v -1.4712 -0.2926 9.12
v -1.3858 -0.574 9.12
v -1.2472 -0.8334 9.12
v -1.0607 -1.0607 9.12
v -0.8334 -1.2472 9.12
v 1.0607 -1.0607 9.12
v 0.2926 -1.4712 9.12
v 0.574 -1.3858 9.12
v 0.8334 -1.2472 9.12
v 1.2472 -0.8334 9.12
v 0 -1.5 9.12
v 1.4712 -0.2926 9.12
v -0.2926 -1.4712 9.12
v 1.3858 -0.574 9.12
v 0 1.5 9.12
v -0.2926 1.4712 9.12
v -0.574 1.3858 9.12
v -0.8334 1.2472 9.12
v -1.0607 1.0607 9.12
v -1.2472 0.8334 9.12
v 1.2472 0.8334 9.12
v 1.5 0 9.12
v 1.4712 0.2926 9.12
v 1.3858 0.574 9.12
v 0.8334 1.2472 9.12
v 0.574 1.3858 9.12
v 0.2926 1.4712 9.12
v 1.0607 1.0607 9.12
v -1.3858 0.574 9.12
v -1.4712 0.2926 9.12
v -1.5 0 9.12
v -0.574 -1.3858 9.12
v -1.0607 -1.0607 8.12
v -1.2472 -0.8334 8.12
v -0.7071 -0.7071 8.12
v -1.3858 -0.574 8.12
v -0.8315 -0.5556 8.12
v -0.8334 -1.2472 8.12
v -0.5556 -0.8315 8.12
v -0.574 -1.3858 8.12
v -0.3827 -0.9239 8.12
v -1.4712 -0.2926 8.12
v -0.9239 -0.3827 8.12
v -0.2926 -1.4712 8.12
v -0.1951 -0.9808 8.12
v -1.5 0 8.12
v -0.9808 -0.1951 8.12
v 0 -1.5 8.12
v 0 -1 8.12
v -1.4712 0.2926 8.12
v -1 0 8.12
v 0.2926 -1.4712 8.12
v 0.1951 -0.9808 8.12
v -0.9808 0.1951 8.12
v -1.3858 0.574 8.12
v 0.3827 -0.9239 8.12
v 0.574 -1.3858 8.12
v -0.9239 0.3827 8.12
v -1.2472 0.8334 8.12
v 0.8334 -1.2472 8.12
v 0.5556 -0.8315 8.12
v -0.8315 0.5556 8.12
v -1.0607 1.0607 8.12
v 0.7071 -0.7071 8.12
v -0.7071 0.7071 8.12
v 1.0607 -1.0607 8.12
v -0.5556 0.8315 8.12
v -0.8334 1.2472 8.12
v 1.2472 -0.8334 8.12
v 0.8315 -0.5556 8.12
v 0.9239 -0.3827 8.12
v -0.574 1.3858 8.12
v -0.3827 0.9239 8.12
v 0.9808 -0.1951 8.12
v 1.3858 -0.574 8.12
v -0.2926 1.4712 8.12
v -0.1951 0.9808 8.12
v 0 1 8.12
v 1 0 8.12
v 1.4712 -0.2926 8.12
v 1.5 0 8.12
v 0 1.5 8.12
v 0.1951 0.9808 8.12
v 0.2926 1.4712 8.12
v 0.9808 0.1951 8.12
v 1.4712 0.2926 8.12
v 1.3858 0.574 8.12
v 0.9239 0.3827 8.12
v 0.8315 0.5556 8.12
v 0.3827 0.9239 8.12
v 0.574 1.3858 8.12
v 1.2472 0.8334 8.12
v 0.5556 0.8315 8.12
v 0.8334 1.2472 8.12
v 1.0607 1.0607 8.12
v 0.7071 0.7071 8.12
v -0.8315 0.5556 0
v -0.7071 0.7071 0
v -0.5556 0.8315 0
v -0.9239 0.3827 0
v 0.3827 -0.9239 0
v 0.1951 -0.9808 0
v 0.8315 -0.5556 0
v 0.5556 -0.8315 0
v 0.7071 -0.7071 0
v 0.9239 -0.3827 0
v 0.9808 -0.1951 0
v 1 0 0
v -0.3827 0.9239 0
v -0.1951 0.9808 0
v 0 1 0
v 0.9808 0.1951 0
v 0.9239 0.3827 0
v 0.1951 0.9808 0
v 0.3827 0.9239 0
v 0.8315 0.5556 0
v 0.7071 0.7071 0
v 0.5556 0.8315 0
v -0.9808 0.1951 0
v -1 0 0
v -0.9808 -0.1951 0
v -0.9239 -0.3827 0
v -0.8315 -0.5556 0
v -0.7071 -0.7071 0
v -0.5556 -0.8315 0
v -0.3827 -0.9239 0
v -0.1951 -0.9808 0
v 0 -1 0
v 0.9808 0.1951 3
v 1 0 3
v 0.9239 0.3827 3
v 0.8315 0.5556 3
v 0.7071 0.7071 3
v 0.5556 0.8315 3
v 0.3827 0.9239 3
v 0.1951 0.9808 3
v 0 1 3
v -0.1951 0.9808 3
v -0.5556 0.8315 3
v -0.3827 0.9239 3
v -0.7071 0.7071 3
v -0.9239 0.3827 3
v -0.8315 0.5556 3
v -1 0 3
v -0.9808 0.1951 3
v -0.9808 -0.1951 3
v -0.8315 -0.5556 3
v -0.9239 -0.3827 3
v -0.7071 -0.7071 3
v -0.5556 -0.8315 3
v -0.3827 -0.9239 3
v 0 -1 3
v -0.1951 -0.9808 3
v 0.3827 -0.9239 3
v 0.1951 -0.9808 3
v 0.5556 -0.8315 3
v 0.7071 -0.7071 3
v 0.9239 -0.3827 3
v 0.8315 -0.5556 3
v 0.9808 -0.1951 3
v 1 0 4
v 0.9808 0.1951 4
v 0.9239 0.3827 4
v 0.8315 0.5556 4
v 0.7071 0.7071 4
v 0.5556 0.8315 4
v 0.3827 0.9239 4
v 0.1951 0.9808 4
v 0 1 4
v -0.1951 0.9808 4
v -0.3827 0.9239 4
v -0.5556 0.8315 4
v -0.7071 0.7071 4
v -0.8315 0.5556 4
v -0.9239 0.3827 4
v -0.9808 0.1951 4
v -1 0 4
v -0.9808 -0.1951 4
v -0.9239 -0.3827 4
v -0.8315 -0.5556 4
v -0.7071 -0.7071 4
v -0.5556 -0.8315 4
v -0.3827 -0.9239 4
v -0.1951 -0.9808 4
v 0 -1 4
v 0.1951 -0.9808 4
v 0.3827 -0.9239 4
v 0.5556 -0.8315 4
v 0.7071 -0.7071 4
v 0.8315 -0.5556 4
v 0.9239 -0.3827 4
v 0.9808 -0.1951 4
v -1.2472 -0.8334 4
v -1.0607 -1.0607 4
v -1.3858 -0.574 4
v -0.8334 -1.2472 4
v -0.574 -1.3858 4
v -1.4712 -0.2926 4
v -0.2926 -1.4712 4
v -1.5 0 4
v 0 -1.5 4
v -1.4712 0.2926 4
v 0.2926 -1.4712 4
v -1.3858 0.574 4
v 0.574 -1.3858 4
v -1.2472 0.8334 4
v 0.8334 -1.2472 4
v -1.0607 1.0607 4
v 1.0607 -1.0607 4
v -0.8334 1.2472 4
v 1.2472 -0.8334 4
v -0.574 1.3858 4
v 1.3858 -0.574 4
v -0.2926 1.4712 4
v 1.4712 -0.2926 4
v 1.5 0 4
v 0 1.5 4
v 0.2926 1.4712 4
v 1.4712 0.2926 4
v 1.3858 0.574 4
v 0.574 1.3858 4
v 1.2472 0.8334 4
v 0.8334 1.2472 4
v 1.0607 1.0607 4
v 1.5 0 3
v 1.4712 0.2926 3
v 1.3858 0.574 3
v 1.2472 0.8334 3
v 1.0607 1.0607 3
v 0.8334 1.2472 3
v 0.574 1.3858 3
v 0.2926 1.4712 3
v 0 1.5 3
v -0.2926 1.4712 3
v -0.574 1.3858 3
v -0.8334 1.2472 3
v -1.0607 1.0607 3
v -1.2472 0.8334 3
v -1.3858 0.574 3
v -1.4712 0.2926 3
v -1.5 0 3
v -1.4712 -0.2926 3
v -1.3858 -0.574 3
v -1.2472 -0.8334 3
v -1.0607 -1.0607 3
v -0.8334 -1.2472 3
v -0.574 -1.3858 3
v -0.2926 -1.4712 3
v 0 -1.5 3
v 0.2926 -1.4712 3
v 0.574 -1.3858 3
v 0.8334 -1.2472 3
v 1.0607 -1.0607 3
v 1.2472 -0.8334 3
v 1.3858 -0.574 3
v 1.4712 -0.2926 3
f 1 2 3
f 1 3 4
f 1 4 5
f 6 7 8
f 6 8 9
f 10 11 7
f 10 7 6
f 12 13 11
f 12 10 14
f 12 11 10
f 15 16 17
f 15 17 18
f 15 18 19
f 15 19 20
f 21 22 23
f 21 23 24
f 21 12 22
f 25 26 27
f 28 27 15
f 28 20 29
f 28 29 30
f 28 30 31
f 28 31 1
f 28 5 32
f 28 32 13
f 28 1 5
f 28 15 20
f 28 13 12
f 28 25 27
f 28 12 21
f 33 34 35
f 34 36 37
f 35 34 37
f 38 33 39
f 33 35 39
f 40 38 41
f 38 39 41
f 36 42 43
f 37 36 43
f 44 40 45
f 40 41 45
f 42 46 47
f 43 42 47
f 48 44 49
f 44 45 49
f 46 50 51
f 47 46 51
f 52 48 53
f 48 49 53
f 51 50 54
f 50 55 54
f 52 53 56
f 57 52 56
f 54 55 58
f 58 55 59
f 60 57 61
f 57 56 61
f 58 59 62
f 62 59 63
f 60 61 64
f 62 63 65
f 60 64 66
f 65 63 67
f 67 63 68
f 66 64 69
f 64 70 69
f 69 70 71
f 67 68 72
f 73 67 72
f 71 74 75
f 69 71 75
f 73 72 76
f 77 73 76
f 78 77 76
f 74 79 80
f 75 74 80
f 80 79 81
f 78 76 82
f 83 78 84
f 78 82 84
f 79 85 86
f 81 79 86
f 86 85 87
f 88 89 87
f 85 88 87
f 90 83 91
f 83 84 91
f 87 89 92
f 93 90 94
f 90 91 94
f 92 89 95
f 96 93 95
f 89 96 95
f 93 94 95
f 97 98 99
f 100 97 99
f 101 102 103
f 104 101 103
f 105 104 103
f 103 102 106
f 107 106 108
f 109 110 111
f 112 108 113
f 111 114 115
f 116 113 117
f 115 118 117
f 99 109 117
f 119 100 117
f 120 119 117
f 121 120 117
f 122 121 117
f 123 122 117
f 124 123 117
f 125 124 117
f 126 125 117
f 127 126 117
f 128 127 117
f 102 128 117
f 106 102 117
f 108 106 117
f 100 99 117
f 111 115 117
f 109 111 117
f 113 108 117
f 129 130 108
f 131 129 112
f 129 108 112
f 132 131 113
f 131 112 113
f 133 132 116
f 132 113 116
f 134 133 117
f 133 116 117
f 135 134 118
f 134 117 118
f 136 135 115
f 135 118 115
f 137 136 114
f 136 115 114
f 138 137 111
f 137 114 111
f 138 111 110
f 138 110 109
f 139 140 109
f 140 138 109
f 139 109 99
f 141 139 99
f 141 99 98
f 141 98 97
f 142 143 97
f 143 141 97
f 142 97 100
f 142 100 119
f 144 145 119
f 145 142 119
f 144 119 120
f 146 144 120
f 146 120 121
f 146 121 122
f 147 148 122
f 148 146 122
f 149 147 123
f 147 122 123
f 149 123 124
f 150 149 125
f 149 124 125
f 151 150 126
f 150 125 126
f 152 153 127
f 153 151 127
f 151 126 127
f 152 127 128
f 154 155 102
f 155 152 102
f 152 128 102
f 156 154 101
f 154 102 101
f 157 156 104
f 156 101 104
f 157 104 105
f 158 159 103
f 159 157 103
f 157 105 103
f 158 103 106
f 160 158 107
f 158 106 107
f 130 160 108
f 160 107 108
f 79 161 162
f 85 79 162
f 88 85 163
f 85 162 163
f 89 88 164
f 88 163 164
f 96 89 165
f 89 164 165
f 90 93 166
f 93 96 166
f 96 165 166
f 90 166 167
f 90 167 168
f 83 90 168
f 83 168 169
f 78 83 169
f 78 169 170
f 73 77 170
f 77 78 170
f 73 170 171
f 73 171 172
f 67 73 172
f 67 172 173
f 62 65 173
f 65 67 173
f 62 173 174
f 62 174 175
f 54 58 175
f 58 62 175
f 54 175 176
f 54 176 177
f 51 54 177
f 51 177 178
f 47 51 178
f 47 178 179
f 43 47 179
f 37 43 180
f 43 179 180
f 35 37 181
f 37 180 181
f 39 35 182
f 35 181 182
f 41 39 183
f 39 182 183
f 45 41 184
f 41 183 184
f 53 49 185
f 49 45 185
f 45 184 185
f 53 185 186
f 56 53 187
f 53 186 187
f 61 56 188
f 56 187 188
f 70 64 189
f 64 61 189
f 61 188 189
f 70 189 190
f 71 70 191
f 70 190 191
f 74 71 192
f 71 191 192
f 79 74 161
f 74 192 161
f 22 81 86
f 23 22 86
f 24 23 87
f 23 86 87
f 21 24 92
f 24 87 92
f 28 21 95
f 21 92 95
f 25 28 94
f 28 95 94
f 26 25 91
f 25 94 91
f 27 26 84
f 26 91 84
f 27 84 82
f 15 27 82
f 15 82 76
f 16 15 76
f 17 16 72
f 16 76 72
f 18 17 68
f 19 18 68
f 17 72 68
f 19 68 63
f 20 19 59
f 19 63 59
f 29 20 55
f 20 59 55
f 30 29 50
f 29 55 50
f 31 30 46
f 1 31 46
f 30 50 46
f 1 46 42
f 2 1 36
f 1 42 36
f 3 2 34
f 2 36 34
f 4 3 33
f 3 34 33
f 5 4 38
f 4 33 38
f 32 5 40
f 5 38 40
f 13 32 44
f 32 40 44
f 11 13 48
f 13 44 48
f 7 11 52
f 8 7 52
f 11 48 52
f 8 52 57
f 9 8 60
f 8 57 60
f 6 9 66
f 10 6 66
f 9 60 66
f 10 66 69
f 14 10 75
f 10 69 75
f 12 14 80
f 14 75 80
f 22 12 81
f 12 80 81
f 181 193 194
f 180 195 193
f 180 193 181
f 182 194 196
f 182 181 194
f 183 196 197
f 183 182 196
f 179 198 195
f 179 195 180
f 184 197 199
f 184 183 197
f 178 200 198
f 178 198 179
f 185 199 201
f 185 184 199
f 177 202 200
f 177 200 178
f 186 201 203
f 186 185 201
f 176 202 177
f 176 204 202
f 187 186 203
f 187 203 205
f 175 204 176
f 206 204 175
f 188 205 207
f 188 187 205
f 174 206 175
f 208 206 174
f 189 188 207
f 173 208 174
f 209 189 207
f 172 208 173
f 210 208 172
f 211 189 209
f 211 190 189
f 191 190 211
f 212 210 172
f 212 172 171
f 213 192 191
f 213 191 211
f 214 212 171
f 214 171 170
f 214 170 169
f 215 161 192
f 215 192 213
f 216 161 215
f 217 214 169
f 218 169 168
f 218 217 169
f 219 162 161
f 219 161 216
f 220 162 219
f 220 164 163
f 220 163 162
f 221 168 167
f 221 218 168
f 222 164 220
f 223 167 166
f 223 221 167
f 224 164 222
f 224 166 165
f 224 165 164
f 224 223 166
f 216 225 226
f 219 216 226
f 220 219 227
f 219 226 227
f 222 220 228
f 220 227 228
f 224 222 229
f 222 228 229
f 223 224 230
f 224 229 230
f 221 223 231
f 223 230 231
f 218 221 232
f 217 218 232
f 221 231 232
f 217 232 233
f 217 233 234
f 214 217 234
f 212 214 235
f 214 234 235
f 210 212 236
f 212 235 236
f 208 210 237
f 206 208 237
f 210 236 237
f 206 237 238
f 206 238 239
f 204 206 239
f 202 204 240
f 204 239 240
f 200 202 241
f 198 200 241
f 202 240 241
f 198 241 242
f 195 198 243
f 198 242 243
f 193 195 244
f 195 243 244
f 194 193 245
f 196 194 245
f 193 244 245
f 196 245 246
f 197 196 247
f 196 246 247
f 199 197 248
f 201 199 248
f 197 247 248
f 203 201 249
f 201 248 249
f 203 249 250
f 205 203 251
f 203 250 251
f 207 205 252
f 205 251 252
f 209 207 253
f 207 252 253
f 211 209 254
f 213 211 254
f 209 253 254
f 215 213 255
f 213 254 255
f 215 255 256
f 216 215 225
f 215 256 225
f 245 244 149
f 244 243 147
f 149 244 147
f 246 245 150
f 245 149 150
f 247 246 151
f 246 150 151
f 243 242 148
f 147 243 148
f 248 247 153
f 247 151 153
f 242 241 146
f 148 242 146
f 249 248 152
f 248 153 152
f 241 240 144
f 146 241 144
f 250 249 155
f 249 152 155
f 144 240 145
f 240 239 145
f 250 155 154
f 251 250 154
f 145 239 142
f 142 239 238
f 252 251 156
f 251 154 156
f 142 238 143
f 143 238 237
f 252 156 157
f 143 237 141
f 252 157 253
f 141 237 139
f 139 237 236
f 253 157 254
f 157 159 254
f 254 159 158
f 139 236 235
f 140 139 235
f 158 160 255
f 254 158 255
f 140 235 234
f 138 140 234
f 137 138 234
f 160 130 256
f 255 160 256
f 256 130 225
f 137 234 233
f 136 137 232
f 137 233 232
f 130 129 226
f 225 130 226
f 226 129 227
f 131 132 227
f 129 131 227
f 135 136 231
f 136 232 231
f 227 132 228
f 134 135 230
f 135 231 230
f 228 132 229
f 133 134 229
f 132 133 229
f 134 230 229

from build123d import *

# Parameters (mm, degrees)
SKETCH1_R               = 1
BOSS_EXTRUDE1_DEPTH     = 9.12
BOSS_EXTRUDE2_START     = 3
BOSS_EXTRUDE2_OUTLINE_R = 1.5
BOSS_EXTRUDE2_DEPTH     = 1
BOSS_EXTRUDE3_START     = -1
SKETCH2_R               = 1.5
BOSS_EXTRUDE3_DEPTH     = 1


# Read off the part's stored shape, not the designer's step: Boss-Extrude2
with BuildPart() as part:
    # Sketch1 → Boss-Extrude1 (new body)
    with BuildSketch(Plane.XY):
        Circle(SKETCH1_R)
    extrude(amount=BOSS_EXTRUDE1_DEPTH)

    # Boss-Extrude2 outline → Boss-Extrude2 (add)
    with BuildSketch(Plane.XY.offset(BOSS_EXTRUDE2_START)):
        Circle(BOSS_EXTRUDE2_OUTLINE_R)
    extrude(amount=BOSS_EXTRUDE2_DEPTH)

    # Sketch2 → Boss-Extrude3 (add)
    with BuildSketch(Plane.XY.offset(9.12).offset(BOSS_EXTRUDE3_START)):
        Circle(SKETCH2_R)
    extrude(amount=BOSS_EXTRUDE3_DEPTH)


solid = part.part
